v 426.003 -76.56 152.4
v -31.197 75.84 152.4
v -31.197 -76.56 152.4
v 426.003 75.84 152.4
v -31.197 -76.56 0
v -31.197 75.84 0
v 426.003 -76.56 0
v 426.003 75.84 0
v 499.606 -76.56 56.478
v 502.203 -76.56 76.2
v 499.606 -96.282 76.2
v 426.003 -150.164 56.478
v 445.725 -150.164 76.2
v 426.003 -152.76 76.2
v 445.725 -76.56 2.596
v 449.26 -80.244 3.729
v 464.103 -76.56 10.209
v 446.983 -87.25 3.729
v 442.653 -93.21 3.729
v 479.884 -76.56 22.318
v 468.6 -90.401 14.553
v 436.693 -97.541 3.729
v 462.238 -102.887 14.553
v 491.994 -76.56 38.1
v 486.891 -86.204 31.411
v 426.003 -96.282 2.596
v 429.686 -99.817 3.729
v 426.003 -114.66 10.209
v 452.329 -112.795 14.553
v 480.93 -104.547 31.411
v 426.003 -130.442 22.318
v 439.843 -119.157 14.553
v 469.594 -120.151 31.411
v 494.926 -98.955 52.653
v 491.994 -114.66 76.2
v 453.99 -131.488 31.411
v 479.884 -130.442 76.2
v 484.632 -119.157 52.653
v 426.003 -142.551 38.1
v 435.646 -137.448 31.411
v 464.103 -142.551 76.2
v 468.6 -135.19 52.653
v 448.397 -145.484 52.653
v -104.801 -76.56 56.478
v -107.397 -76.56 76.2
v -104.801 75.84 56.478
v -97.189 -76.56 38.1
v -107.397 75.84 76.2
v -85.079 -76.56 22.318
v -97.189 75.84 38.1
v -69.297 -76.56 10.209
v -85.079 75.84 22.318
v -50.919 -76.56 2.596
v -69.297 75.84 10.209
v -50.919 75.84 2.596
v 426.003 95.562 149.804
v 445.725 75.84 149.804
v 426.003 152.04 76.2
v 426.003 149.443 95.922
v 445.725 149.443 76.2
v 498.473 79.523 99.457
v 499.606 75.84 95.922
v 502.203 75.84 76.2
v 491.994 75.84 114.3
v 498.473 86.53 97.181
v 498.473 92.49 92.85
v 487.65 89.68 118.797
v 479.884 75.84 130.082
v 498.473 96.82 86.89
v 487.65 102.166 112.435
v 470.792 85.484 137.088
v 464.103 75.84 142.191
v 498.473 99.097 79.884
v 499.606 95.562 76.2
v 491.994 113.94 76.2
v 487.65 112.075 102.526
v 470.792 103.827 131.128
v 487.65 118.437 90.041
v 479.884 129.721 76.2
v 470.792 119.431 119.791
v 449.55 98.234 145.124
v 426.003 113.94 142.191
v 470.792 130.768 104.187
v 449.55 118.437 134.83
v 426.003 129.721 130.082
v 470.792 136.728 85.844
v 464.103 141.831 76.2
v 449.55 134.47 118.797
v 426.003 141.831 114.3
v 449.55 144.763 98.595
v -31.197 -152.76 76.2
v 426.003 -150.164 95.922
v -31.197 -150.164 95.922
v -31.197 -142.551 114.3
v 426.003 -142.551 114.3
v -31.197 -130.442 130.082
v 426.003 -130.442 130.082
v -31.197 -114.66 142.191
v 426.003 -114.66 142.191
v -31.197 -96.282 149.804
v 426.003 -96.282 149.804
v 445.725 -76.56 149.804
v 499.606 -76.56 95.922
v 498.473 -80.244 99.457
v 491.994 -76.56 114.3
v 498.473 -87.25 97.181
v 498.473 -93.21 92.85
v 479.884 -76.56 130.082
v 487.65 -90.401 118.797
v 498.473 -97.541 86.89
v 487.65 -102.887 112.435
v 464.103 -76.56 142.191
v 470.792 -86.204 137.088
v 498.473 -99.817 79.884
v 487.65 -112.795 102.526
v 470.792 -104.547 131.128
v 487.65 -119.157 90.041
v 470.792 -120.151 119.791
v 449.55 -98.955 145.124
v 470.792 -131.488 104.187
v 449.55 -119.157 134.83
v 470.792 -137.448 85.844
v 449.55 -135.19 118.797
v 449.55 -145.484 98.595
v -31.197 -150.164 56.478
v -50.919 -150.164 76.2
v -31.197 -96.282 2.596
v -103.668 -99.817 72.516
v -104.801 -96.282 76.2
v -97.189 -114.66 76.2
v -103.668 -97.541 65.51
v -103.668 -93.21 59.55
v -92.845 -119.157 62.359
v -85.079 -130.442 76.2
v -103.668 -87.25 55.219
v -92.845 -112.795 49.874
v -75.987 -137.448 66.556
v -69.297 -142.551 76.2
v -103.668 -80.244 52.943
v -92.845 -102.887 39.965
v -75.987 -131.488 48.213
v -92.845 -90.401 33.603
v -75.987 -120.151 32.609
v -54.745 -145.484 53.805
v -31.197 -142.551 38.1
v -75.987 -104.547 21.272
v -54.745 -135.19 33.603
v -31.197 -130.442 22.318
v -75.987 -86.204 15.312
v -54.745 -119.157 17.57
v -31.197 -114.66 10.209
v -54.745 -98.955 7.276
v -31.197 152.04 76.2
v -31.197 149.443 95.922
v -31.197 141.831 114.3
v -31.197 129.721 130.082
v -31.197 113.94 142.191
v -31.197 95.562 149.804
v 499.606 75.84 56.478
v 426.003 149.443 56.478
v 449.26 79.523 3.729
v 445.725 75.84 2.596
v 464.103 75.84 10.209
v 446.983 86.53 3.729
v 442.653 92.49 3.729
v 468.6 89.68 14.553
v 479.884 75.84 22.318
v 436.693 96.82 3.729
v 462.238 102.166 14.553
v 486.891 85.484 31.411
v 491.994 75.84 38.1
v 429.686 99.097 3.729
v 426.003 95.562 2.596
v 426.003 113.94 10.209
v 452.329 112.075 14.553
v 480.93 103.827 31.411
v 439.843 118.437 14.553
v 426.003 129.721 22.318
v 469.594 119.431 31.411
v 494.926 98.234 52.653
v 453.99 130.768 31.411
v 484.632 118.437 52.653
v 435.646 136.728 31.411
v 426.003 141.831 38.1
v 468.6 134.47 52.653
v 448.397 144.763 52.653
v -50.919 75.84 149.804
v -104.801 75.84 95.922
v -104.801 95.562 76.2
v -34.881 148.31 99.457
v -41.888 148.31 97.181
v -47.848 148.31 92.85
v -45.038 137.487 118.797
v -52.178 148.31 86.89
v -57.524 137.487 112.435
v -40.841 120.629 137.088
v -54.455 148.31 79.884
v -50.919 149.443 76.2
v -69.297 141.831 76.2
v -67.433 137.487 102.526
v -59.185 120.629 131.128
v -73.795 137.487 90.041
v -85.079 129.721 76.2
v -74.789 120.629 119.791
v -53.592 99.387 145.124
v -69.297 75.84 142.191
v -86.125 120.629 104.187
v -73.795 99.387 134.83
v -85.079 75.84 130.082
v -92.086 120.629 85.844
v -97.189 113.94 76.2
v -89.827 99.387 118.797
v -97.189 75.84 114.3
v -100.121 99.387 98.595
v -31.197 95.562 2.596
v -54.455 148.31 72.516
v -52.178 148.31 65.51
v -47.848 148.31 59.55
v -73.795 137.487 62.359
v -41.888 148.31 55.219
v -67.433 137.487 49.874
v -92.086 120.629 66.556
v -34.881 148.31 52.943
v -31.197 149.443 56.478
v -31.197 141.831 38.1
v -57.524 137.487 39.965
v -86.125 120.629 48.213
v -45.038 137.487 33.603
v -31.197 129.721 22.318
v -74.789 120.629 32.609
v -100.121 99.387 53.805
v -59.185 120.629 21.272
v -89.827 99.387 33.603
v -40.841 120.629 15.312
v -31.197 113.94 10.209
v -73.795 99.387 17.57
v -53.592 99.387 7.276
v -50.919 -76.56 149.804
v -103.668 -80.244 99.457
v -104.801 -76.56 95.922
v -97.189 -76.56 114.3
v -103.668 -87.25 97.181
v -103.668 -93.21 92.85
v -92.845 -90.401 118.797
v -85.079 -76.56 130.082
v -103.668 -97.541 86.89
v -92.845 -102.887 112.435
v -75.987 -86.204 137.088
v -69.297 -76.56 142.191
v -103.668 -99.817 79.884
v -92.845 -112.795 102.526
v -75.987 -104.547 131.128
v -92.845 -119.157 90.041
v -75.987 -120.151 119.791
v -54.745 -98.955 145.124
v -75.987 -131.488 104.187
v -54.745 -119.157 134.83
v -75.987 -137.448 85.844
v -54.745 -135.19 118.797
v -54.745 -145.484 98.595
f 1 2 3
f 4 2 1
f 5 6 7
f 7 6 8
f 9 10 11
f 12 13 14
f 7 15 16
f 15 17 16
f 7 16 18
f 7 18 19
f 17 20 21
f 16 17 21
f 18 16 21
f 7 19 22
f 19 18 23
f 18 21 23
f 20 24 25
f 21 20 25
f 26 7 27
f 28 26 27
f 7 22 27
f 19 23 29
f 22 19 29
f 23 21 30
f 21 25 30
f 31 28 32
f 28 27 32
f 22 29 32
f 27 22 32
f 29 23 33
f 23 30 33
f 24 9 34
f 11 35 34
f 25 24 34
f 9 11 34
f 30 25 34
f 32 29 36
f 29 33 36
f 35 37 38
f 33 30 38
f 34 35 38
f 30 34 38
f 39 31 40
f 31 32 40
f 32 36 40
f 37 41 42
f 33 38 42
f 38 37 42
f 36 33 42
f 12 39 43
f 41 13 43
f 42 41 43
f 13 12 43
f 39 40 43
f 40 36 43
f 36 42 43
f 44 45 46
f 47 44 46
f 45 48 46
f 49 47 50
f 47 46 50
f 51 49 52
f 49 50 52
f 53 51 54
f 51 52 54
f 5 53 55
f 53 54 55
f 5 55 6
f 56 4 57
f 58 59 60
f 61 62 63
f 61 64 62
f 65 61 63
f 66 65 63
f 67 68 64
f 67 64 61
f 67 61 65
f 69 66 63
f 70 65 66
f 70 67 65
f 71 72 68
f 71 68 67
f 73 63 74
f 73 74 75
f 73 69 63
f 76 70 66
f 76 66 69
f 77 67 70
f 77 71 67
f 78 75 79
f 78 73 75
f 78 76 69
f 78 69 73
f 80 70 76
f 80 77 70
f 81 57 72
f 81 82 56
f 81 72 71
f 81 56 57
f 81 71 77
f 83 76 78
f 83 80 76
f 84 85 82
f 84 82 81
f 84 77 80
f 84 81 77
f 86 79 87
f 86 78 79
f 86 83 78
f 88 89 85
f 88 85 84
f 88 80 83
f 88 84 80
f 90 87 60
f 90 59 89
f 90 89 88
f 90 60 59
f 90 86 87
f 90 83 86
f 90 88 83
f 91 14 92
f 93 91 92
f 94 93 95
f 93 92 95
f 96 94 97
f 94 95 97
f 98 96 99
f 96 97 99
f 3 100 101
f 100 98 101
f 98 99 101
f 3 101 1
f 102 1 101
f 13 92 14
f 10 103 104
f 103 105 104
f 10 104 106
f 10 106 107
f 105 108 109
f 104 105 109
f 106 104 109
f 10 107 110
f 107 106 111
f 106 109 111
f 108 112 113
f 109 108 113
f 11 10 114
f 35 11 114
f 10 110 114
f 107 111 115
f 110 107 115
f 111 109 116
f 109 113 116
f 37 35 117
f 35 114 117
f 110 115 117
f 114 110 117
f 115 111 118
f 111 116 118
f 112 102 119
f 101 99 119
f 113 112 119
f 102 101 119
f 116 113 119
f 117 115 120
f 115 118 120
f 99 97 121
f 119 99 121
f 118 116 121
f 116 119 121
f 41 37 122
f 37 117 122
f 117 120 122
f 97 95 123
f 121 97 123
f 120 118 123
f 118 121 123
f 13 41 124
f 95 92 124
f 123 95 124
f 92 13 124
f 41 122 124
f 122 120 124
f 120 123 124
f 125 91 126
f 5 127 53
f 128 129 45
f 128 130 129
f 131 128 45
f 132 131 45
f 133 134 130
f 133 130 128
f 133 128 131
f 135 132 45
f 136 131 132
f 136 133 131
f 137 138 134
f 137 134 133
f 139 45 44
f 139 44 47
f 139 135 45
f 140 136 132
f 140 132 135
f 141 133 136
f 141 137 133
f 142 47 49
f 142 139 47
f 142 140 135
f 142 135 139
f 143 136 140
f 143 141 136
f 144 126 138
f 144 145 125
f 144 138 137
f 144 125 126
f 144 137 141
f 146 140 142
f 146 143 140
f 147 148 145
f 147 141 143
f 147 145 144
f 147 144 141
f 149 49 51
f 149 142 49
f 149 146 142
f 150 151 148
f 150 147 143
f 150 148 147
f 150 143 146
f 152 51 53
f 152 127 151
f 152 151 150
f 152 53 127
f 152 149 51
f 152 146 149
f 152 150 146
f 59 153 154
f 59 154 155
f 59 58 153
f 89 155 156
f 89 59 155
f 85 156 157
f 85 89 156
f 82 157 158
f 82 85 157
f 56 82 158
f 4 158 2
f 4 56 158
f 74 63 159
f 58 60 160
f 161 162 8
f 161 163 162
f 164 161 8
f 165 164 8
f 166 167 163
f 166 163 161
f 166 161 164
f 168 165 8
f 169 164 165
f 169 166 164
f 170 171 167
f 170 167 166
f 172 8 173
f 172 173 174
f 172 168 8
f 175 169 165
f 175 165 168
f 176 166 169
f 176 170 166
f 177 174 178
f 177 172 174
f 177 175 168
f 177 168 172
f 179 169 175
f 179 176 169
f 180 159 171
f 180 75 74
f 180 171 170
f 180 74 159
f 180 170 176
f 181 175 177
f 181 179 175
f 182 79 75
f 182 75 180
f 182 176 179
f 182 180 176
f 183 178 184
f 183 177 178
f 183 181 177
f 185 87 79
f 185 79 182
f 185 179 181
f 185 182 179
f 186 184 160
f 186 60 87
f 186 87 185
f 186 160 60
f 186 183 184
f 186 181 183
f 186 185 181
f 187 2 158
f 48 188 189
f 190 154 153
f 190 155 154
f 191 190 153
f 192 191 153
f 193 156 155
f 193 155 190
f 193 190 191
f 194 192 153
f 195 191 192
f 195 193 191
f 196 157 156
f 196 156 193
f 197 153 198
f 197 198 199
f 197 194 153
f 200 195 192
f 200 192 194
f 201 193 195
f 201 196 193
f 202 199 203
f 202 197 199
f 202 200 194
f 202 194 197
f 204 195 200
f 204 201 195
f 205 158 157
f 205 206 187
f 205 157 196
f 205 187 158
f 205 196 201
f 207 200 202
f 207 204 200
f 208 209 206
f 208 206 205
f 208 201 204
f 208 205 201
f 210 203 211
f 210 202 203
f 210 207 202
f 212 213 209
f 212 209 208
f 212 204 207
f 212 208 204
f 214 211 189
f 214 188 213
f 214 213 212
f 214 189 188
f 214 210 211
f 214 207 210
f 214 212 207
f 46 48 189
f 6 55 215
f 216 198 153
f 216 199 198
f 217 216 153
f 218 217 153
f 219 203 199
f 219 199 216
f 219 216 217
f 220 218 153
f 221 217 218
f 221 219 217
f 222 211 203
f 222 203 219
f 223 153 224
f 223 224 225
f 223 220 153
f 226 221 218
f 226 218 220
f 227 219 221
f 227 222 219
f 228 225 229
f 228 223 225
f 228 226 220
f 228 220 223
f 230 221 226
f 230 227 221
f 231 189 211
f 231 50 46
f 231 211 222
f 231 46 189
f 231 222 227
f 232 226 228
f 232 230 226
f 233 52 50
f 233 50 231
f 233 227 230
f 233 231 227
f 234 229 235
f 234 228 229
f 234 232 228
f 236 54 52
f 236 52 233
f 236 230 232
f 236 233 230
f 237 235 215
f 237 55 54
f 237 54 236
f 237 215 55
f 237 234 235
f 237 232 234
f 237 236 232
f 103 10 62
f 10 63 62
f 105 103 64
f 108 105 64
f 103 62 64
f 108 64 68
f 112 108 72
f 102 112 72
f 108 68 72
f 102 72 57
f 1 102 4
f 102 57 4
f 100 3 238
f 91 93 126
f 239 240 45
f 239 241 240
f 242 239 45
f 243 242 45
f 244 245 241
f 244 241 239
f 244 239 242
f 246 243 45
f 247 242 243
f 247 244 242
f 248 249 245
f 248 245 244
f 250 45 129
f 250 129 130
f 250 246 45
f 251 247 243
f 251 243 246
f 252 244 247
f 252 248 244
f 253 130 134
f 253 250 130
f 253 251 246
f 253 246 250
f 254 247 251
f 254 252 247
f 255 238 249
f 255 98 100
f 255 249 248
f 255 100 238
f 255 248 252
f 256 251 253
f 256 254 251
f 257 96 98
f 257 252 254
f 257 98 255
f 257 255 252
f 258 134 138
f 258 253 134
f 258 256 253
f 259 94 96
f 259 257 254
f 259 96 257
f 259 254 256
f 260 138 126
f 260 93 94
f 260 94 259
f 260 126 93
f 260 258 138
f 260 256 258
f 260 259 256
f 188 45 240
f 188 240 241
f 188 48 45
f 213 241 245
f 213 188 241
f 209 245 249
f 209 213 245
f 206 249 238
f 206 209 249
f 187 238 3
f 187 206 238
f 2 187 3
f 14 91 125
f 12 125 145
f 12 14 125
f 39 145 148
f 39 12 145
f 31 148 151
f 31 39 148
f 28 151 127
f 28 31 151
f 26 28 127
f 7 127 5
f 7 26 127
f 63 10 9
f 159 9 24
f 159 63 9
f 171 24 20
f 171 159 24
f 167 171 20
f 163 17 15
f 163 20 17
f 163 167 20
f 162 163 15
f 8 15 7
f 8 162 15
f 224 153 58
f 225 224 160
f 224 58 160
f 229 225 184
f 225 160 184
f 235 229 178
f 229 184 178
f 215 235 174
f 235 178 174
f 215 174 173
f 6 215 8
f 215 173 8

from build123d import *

# Parameters (mm, degrees)
F0_W     = 609.6
F0_H     = 304.8
F1_DEPTH = 152.4
F2_R     = 76.19999


# Not quite as in the source:
# - a fillet or chamfer is up to 0.001 mm smaller than in the source, because OpenCascade refuses the exact size


with BuildPart() as f1:
    # F0 (on Top) → F1 (new body)
    with BuildSketch(Plane.XY):
        with Locations((197.4025189088, -0.3601741046)):
            Rectangle(F0_W, F0_H)
    extrude(amount=F1_DEPTH)

    # F2 (radius 76.2 in the source; OpenCascade refuses exactly that, so slightly less here)
    f2_edges = [f1.edges().sort_by_distance(p)[0] for p in [
        (197.402519, -152.760174, 152.4),
        (-107.397481, -0.360174, 152.4),
        (197.402519, 152.039826, 152.4),
        (502.202519, -0.360174, 152.4),
        (502.202519, -152.760174, 76.2),
        (502.202519, 152.039826, 76.2),
        (502.202519, -0.360174, 0),
        (197.402519, -152.760174, 0),
        (-107.397481, -152.760174, 76.2),
        (-107.397481, -0.360174, 0),
        (-107.397481, 152.039826, 76.2),
        (197.402519, 152.039826, 0),
    ]]
    fillet(f2_edges, radius=F2_R)


solid = f1.part
